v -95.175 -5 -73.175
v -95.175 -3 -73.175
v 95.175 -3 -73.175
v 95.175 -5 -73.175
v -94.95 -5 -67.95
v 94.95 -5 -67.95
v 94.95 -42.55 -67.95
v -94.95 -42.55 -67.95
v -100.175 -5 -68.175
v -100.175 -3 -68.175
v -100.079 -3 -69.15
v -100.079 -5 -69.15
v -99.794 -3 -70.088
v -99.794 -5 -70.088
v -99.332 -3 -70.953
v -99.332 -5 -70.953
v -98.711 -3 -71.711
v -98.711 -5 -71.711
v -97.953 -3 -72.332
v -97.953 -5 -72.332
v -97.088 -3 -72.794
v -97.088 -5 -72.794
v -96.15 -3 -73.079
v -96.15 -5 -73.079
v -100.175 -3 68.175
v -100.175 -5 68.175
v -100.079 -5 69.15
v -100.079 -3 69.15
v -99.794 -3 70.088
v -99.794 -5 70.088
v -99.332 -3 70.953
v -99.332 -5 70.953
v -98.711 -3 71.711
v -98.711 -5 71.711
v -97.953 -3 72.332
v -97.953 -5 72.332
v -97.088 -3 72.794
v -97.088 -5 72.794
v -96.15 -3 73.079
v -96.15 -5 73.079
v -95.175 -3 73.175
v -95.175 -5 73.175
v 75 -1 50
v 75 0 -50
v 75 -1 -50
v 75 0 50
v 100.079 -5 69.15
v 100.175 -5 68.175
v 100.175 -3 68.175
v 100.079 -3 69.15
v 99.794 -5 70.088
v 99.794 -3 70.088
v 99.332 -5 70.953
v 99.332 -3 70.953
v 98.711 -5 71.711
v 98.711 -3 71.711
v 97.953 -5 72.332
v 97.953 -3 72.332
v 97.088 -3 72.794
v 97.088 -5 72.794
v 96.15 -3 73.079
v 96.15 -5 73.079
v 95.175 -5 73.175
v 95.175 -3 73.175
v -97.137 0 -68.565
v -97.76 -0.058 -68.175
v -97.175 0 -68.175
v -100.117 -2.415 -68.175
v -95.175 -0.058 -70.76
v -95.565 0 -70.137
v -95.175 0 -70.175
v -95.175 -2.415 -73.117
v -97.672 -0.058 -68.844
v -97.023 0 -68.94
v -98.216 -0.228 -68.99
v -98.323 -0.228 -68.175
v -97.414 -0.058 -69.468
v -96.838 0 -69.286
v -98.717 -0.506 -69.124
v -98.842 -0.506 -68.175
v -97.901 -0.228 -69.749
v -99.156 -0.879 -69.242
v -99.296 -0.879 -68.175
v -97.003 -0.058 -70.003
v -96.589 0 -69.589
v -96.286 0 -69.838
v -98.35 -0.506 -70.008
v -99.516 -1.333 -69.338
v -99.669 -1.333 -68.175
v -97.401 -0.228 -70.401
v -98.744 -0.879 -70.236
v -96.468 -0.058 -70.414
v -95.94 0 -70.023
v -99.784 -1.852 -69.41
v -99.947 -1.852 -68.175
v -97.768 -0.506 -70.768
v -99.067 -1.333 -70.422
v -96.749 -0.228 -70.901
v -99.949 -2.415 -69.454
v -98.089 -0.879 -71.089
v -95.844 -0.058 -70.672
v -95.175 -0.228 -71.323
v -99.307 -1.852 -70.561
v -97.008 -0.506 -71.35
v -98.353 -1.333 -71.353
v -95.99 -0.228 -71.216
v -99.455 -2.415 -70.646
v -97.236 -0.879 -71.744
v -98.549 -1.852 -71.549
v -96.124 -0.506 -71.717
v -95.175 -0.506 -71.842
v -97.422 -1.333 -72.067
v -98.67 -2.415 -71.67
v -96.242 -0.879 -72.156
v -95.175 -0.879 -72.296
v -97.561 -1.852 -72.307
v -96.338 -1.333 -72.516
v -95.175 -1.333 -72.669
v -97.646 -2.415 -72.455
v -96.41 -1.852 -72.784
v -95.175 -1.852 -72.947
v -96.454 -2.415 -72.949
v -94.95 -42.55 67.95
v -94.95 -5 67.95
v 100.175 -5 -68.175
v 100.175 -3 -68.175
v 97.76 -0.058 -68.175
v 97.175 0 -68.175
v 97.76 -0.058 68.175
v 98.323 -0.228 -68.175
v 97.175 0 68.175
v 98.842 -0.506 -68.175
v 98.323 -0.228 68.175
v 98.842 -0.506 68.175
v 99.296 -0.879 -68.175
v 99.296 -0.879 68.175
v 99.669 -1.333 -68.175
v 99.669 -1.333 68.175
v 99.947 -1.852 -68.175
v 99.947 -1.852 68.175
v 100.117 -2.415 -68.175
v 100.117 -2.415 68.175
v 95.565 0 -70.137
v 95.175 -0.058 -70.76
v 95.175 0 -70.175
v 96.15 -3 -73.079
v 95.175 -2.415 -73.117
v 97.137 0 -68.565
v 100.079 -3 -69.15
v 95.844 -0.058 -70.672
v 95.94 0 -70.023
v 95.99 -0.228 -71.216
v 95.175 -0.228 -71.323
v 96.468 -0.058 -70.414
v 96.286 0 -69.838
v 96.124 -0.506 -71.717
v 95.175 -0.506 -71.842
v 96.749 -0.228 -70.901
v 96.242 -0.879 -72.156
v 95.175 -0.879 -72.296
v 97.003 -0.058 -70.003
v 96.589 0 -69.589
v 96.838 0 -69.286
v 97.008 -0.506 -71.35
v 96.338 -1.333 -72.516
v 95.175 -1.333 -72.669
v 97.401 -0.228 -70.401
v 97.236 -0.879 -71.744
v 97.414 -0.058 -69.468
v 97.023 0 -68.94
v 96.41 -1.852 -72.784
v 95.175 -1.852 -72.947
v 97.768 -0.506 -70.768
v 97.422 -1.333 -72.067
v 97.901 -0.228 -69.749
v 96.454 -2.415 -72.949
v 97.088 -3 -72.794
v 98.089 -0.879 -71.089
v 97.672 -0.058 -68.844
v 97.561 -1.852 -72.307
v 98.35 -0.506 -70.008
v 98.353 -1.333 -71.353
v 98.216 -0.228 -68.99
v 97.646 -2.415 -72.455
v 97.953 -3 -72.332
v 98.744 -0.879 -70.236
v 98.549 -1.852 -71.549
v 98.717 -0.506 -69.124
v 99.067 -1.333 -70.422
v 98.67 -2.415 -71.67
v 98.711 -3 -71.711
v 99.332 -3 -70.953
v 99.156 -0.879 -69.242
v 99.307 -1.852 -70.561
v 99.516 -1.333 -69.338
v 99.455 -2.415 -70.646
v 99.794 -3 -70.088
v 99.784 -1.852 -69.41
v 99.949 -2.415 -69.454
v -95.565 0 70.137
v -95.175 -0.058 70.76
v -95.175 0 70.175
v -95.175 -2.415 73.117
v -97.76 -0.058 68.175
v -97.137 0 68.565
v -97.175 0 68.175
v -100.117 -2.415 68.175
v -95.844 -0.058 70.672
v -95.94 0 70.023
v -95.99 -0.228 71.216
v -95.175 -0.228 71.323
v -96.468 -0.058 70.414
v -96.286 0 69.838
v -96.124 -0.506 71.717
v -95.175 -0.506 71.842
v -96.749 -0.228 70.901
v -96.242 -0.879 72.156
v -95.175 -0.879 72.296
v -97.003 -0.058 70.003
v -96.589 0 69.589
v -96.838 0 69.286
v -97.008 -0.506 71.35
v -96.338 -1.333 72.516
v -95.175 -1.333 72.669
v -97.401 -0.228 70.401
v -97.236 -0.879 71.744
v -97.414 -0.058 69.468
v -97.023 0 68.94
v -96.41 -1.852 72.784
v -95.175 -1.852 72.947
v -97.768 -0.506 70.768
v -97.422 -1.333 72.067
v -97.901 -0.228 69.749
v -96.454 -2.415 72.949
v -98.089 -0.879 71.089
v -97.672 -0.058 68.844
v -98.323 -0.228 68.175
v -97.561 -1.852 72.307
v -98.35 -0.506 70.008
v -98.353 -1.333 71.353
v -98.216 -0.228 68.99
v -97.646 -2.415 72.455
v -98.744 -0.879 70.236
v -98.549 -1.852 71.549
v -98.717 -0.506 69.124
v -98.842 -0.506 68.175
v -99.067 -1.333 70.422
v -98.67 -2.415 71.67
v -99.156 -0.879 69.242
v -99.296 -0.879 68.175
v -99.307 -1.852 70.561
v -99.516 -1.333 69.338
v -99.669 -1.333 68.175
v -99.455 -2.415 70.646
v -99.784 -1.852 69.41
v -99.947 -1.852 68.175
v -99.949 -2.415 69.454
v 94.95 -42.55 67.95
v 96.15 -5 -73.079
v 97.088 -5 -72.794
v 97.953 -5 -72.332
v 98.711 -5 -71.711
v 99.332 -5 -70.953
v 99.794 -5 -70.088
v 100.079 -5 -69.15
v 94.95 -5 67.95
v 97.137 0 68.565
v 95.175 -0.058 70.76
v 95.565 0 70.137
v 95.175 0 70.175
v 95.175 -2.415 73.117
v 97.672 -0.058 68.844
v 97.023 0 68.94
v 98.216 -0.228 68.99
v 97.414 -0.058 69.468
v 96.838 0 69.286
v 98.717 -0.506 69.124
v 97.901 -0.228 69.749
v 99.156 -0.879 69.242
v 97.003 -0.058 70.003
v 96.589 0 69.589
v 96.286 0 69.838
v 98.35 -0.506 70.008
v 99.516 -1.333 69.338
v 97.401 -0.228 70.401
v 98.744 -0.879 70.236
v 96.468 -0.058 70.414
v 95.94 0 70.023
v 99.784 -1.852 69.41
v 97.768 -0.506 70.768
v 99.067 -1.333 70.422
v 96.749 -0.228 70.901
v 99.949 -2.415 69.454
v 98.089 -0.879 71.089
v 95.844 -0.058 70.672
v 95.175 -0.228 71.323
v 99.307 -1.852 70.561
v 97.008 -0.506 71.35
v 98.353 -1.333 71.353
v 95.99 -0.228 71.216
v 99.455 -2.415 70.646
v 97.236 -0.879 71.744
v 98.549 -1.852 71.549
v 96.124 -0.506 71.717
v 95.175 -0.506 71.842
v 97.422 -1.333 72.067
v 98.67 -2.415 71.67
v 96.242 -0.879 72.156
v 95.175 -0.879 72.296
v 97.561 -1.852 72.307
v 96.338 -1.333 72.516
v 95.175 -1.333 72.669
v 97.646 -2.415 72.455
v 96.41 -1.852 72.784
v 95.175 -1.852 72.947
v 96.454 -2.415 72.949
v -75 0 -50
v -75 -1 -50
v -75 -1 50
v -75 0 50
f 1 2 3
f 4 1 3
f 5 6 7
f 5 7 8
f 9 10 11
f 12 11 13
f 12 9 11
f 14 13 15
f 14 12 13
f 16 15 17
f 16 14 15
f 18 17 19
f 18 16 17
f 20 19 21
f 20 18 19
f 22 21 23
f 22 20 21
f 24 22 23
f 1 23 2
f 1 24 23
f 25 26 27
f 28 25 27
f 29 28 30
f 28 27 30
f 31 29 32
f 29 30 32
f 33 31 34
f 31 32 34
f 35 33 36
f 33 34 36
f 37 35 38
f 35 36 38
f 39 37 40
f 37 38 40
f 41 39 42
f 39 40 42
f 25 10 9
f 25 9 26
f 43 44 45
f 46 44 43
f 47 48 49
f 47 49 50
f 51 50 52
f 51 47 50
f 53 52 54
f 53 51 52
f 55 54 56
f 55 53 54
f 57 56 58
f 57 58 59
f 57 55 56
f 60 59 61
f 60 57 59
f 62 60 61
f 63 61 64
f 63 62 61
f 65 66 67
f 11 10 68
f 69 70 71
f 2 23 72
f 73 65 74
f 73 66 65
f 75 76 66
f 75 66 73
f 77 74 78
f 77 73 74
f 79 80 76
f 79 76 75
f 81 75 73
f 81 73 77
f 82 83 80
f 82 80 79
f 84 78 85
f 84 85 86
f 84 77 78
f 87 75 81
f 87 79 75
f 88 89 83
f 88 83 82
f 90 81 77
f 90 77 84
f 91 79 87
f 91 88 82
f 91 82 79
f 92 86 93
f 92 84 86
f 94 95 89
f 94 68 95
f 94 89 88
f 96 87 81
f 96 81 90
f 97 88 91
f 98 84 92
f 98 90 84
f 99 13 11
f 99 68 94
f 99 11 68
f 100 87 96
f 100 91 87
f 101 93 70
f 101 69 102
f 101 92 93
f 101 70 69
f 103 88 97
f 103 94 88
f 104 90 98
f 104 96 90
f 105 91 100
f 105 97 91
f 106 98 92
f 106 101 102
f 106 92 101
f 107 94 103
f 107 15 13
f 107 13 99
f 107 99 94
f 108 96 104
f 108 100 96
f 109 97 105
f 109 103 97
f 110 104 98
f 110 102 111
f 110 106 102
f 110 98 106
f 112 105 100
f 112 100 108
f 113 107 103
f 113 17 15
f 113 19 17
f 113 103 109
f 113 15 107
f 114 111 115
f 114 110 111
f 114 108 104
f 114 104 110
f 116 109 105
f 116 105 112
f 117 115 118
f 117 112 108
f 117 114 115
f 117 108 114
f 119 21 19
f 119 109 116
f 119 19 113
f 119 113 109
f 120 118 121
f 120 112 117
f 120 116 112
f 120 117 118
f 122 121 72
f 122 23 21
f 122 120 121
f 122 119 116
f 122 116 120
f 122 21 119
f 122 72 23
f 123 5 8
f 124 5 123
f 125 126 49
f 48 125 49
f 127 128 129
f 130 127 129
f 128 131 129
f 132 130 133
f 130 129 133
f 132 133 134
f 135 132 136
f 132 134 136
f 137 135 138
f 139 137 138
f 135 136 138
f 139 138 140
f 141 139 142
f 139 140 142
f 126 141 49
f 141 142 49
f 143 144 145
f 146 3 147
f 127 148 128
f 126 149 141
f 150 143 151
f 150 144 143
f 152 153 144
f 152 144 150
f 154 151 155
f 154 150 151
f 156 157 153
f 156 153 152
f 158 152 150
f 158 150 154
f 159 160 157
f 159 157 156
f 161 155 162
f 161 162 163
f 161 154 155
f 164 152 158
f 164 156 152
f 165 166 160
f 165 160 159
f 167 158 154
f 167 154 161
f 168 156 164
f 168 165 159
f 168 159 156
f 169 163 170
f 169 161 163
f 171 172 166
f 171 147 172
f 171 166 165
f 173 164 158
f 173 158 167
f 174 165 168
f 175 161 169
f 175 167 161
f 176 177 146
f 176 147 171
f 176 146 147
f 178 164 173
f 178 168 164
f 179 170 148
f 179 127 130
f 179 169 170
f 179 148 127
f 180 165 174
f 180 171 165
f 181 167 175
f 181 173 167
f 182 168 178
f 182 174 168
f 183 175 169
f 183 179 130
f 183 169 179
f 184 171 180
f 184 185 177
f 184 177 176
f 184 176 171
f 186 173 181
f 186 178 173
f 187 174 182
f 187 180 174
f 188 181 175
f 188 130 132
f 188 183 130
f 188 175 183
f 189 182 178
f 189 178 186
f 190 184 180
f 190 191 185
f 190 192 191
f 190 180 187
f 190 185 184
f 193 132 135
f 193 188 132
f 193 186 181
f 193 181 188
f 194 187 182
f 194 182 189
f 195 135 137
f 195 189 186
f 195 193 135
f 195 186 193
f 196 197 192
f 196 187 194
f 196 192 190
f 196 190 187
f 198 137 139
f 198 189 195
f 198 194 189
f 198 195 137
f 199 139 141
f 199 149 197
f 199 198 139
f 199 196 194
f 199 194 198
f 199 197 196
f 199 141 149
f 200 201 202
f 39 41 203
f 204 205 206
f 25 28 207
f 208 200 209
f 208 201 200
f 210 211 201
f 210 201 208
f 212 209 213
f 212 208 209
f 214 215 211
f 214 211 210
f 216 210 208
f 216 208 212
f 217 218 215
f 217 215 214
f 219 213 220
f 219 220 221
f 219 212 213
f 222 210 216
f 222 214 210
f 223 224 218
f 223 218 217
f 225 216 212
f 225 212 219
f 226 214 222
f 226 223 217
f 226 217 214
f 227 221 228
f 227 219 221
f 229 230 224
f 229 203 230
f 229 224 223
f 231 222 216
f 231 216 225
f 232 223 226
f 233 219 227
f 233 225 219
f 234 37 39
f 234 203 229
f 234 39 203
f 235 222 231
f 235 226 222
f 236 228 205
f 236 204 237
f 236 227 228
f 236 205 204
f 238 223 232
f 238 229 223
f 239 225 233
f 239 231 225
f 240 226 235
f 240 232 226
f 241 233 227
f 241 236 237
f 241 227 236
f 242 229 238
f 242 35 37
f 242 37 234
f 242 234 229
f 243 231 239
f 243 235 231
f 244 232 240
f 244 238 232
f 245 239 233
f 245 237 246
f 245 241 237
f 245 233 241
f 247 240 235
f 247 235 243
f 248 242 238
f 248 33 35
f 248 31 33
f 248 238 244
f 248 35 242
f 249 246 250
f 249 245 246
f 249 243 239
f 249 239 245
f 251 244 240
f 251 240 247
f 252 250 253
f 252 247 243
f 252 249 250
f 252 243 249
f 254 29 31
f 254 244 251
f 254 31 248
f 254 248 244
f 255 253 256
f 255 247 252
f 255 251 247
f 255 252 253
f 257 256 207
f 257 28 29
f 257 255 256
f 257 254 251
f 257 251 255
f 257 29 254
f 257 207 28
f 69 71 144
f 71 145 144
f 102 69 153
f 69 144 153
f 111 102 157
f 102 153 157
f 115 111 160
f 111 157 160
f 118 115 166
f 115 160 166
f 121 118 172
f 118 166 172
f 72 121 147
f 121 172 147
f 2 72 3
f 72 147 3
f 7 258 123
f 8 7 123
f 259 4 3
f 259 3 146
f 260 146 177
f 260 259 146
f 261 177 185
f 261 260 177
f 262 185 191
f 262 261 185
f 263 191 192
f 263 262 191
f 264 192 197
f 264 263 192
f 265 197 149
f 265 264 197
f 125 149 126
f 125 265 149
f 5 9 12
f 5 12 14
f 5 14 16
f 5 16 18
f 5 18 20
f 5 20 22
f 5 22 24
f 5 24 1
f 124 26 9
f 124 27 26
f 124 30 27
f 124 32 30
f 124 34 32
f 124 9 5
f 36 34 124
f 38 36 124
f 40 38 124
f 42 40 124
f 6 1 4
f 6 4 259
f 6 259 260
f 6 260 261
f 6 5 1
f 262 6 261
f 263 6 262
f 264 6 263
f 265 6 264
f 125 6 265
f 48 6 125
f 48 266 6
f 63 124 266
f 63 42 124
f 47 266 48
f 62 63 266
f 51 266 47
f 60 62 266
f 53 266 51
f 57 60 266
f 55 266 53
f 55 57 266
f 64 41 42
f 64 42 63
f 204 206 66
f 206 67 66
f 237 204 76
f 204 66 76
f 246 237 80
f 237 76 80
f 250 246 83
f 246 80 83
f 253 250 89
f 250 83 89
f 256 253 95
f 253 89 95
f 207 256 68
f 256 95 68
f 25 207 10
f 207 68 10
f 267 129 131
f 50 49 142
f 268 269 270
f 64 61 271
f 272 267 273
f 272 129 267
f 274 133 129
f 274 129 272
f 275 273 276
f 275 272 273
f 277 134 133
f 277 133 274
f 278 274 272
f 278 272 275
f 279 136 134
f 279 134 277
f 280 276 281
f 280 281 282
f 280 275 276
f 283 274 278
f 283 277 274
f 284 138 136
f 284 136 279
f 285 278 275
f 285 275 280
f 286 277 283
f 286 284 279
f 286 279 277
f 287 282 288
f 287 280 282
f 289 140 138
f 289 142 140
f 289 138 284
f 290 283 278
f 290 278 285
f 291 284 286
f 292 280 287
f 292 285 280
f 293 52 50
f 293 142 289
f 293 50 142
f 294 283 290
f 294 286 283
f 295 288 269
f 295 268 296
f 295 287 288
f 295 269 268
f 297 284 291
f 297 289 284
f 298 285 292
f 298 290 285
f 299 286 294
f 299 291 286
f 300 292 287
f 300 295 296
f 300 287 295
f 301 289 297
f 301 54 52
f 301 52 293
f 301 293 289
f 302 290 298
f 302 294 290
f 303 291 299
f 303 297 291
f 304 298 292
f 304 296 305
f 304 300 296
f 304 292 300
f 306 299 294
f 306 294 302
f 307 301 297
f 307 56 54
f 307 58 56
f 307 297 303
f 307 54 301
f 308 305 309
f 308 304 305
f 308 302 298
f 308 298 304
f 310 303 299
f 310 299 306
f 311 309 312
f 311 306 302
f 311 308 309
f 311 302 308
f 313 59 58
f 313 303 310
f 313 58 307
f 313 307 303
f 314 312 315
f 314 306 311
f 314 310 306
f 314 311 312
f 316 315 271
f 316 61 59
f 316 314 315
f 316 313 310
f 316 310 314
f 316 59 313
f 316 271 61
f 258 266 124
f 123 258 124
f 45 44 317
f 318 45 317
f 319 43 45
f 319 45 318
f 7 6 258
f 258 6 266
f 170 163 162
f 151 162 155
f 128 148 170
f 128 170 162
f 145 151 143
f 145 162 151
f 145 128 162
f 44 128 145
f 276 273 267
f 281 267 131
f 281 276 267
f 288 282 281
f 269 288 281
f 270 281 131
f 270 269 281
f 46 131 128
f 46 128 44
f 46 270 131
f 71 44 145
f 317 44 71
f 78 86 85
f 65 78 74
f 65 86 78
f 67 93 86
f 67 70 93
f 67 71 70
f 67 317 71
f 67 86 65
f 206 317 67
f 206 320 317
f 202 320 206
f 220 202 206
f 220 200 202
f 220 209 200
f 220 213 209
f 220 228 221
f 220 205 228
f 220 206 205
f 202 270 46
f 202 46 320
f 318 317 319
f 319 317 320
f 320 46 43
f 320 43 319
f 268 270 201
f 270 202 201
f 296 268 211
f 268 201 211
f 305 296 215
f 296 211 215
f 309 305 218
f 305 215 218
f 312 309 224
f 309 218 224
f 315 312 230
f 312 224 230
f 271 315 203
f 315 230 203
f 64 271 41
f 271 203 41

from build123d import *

# Parameters (mm, degrees)
F0_W     = 200.35
F0_H     = 146.35
F1_DEPTH = 5
F2_R     = 5
F3_W     = 189.9
F3_H     = 135.9
F4_DEPTH = 42.55
F5_R     = 3
F6_W     = 150
F6_H     = 100
F7_DEPTH = 1


with BuildPart() as f1:
    # F0 (on Front) → F1 (new body)
    with BuildSketch(Plane.XZ):
        Rectangle(F0_W, F0_H)
    extrude(amount=F1_DEPTH)

    # F2
    f2_edges = [f1.edges().sort_by_distance(p)[0] for p in [
        (100.175, -2.5, 73.175),
        (-100.175, -2.5, 73.175),
        (-100.175, -2.5, -73.175),
        (100.175, -2.5, -73.175),
    ]]
    fillet(f2_edges, radius=F2_R)

    # F3 (on face) → F4 (join)
    with BuildSketch(Plane(origin=(0, 0, 0), x_dir=(-1, 0, 0), z_dir=(0, 1, 0))):
        Rectangle(F3_W, F3_H)
    extrude(amount=-F4_DEPTH)

    # F5
    f5_edges = [f1.edges().sort_by_distance(p)[0] for p in [
        (100.175, 0, 0),
        (98.710534, 0, 71.710534),
        (0, 0, 73.175),
        (-98.710534, 0, 71.710534),
        (-100.175, 0, 0),
        (-98.710534, 0, -71.710534),
        (0, 0, -73.175),
        (98.710534, 0, -71.710534),
    ]]
    fillet(f5_edges, radius=F5_R)

    # F6 (on face) → F7 (cut)
    with BuildSketch(Plane(origin=(0, 0, 0), x_dir=(-1, 0, 0), z_dir=(0, 1, 0))):
        Rectangle(F6_W, F6_H)
    extrude(amount=-F7_DEPTH, mode=Mode.SUBTRACT)


solid = f1.part
